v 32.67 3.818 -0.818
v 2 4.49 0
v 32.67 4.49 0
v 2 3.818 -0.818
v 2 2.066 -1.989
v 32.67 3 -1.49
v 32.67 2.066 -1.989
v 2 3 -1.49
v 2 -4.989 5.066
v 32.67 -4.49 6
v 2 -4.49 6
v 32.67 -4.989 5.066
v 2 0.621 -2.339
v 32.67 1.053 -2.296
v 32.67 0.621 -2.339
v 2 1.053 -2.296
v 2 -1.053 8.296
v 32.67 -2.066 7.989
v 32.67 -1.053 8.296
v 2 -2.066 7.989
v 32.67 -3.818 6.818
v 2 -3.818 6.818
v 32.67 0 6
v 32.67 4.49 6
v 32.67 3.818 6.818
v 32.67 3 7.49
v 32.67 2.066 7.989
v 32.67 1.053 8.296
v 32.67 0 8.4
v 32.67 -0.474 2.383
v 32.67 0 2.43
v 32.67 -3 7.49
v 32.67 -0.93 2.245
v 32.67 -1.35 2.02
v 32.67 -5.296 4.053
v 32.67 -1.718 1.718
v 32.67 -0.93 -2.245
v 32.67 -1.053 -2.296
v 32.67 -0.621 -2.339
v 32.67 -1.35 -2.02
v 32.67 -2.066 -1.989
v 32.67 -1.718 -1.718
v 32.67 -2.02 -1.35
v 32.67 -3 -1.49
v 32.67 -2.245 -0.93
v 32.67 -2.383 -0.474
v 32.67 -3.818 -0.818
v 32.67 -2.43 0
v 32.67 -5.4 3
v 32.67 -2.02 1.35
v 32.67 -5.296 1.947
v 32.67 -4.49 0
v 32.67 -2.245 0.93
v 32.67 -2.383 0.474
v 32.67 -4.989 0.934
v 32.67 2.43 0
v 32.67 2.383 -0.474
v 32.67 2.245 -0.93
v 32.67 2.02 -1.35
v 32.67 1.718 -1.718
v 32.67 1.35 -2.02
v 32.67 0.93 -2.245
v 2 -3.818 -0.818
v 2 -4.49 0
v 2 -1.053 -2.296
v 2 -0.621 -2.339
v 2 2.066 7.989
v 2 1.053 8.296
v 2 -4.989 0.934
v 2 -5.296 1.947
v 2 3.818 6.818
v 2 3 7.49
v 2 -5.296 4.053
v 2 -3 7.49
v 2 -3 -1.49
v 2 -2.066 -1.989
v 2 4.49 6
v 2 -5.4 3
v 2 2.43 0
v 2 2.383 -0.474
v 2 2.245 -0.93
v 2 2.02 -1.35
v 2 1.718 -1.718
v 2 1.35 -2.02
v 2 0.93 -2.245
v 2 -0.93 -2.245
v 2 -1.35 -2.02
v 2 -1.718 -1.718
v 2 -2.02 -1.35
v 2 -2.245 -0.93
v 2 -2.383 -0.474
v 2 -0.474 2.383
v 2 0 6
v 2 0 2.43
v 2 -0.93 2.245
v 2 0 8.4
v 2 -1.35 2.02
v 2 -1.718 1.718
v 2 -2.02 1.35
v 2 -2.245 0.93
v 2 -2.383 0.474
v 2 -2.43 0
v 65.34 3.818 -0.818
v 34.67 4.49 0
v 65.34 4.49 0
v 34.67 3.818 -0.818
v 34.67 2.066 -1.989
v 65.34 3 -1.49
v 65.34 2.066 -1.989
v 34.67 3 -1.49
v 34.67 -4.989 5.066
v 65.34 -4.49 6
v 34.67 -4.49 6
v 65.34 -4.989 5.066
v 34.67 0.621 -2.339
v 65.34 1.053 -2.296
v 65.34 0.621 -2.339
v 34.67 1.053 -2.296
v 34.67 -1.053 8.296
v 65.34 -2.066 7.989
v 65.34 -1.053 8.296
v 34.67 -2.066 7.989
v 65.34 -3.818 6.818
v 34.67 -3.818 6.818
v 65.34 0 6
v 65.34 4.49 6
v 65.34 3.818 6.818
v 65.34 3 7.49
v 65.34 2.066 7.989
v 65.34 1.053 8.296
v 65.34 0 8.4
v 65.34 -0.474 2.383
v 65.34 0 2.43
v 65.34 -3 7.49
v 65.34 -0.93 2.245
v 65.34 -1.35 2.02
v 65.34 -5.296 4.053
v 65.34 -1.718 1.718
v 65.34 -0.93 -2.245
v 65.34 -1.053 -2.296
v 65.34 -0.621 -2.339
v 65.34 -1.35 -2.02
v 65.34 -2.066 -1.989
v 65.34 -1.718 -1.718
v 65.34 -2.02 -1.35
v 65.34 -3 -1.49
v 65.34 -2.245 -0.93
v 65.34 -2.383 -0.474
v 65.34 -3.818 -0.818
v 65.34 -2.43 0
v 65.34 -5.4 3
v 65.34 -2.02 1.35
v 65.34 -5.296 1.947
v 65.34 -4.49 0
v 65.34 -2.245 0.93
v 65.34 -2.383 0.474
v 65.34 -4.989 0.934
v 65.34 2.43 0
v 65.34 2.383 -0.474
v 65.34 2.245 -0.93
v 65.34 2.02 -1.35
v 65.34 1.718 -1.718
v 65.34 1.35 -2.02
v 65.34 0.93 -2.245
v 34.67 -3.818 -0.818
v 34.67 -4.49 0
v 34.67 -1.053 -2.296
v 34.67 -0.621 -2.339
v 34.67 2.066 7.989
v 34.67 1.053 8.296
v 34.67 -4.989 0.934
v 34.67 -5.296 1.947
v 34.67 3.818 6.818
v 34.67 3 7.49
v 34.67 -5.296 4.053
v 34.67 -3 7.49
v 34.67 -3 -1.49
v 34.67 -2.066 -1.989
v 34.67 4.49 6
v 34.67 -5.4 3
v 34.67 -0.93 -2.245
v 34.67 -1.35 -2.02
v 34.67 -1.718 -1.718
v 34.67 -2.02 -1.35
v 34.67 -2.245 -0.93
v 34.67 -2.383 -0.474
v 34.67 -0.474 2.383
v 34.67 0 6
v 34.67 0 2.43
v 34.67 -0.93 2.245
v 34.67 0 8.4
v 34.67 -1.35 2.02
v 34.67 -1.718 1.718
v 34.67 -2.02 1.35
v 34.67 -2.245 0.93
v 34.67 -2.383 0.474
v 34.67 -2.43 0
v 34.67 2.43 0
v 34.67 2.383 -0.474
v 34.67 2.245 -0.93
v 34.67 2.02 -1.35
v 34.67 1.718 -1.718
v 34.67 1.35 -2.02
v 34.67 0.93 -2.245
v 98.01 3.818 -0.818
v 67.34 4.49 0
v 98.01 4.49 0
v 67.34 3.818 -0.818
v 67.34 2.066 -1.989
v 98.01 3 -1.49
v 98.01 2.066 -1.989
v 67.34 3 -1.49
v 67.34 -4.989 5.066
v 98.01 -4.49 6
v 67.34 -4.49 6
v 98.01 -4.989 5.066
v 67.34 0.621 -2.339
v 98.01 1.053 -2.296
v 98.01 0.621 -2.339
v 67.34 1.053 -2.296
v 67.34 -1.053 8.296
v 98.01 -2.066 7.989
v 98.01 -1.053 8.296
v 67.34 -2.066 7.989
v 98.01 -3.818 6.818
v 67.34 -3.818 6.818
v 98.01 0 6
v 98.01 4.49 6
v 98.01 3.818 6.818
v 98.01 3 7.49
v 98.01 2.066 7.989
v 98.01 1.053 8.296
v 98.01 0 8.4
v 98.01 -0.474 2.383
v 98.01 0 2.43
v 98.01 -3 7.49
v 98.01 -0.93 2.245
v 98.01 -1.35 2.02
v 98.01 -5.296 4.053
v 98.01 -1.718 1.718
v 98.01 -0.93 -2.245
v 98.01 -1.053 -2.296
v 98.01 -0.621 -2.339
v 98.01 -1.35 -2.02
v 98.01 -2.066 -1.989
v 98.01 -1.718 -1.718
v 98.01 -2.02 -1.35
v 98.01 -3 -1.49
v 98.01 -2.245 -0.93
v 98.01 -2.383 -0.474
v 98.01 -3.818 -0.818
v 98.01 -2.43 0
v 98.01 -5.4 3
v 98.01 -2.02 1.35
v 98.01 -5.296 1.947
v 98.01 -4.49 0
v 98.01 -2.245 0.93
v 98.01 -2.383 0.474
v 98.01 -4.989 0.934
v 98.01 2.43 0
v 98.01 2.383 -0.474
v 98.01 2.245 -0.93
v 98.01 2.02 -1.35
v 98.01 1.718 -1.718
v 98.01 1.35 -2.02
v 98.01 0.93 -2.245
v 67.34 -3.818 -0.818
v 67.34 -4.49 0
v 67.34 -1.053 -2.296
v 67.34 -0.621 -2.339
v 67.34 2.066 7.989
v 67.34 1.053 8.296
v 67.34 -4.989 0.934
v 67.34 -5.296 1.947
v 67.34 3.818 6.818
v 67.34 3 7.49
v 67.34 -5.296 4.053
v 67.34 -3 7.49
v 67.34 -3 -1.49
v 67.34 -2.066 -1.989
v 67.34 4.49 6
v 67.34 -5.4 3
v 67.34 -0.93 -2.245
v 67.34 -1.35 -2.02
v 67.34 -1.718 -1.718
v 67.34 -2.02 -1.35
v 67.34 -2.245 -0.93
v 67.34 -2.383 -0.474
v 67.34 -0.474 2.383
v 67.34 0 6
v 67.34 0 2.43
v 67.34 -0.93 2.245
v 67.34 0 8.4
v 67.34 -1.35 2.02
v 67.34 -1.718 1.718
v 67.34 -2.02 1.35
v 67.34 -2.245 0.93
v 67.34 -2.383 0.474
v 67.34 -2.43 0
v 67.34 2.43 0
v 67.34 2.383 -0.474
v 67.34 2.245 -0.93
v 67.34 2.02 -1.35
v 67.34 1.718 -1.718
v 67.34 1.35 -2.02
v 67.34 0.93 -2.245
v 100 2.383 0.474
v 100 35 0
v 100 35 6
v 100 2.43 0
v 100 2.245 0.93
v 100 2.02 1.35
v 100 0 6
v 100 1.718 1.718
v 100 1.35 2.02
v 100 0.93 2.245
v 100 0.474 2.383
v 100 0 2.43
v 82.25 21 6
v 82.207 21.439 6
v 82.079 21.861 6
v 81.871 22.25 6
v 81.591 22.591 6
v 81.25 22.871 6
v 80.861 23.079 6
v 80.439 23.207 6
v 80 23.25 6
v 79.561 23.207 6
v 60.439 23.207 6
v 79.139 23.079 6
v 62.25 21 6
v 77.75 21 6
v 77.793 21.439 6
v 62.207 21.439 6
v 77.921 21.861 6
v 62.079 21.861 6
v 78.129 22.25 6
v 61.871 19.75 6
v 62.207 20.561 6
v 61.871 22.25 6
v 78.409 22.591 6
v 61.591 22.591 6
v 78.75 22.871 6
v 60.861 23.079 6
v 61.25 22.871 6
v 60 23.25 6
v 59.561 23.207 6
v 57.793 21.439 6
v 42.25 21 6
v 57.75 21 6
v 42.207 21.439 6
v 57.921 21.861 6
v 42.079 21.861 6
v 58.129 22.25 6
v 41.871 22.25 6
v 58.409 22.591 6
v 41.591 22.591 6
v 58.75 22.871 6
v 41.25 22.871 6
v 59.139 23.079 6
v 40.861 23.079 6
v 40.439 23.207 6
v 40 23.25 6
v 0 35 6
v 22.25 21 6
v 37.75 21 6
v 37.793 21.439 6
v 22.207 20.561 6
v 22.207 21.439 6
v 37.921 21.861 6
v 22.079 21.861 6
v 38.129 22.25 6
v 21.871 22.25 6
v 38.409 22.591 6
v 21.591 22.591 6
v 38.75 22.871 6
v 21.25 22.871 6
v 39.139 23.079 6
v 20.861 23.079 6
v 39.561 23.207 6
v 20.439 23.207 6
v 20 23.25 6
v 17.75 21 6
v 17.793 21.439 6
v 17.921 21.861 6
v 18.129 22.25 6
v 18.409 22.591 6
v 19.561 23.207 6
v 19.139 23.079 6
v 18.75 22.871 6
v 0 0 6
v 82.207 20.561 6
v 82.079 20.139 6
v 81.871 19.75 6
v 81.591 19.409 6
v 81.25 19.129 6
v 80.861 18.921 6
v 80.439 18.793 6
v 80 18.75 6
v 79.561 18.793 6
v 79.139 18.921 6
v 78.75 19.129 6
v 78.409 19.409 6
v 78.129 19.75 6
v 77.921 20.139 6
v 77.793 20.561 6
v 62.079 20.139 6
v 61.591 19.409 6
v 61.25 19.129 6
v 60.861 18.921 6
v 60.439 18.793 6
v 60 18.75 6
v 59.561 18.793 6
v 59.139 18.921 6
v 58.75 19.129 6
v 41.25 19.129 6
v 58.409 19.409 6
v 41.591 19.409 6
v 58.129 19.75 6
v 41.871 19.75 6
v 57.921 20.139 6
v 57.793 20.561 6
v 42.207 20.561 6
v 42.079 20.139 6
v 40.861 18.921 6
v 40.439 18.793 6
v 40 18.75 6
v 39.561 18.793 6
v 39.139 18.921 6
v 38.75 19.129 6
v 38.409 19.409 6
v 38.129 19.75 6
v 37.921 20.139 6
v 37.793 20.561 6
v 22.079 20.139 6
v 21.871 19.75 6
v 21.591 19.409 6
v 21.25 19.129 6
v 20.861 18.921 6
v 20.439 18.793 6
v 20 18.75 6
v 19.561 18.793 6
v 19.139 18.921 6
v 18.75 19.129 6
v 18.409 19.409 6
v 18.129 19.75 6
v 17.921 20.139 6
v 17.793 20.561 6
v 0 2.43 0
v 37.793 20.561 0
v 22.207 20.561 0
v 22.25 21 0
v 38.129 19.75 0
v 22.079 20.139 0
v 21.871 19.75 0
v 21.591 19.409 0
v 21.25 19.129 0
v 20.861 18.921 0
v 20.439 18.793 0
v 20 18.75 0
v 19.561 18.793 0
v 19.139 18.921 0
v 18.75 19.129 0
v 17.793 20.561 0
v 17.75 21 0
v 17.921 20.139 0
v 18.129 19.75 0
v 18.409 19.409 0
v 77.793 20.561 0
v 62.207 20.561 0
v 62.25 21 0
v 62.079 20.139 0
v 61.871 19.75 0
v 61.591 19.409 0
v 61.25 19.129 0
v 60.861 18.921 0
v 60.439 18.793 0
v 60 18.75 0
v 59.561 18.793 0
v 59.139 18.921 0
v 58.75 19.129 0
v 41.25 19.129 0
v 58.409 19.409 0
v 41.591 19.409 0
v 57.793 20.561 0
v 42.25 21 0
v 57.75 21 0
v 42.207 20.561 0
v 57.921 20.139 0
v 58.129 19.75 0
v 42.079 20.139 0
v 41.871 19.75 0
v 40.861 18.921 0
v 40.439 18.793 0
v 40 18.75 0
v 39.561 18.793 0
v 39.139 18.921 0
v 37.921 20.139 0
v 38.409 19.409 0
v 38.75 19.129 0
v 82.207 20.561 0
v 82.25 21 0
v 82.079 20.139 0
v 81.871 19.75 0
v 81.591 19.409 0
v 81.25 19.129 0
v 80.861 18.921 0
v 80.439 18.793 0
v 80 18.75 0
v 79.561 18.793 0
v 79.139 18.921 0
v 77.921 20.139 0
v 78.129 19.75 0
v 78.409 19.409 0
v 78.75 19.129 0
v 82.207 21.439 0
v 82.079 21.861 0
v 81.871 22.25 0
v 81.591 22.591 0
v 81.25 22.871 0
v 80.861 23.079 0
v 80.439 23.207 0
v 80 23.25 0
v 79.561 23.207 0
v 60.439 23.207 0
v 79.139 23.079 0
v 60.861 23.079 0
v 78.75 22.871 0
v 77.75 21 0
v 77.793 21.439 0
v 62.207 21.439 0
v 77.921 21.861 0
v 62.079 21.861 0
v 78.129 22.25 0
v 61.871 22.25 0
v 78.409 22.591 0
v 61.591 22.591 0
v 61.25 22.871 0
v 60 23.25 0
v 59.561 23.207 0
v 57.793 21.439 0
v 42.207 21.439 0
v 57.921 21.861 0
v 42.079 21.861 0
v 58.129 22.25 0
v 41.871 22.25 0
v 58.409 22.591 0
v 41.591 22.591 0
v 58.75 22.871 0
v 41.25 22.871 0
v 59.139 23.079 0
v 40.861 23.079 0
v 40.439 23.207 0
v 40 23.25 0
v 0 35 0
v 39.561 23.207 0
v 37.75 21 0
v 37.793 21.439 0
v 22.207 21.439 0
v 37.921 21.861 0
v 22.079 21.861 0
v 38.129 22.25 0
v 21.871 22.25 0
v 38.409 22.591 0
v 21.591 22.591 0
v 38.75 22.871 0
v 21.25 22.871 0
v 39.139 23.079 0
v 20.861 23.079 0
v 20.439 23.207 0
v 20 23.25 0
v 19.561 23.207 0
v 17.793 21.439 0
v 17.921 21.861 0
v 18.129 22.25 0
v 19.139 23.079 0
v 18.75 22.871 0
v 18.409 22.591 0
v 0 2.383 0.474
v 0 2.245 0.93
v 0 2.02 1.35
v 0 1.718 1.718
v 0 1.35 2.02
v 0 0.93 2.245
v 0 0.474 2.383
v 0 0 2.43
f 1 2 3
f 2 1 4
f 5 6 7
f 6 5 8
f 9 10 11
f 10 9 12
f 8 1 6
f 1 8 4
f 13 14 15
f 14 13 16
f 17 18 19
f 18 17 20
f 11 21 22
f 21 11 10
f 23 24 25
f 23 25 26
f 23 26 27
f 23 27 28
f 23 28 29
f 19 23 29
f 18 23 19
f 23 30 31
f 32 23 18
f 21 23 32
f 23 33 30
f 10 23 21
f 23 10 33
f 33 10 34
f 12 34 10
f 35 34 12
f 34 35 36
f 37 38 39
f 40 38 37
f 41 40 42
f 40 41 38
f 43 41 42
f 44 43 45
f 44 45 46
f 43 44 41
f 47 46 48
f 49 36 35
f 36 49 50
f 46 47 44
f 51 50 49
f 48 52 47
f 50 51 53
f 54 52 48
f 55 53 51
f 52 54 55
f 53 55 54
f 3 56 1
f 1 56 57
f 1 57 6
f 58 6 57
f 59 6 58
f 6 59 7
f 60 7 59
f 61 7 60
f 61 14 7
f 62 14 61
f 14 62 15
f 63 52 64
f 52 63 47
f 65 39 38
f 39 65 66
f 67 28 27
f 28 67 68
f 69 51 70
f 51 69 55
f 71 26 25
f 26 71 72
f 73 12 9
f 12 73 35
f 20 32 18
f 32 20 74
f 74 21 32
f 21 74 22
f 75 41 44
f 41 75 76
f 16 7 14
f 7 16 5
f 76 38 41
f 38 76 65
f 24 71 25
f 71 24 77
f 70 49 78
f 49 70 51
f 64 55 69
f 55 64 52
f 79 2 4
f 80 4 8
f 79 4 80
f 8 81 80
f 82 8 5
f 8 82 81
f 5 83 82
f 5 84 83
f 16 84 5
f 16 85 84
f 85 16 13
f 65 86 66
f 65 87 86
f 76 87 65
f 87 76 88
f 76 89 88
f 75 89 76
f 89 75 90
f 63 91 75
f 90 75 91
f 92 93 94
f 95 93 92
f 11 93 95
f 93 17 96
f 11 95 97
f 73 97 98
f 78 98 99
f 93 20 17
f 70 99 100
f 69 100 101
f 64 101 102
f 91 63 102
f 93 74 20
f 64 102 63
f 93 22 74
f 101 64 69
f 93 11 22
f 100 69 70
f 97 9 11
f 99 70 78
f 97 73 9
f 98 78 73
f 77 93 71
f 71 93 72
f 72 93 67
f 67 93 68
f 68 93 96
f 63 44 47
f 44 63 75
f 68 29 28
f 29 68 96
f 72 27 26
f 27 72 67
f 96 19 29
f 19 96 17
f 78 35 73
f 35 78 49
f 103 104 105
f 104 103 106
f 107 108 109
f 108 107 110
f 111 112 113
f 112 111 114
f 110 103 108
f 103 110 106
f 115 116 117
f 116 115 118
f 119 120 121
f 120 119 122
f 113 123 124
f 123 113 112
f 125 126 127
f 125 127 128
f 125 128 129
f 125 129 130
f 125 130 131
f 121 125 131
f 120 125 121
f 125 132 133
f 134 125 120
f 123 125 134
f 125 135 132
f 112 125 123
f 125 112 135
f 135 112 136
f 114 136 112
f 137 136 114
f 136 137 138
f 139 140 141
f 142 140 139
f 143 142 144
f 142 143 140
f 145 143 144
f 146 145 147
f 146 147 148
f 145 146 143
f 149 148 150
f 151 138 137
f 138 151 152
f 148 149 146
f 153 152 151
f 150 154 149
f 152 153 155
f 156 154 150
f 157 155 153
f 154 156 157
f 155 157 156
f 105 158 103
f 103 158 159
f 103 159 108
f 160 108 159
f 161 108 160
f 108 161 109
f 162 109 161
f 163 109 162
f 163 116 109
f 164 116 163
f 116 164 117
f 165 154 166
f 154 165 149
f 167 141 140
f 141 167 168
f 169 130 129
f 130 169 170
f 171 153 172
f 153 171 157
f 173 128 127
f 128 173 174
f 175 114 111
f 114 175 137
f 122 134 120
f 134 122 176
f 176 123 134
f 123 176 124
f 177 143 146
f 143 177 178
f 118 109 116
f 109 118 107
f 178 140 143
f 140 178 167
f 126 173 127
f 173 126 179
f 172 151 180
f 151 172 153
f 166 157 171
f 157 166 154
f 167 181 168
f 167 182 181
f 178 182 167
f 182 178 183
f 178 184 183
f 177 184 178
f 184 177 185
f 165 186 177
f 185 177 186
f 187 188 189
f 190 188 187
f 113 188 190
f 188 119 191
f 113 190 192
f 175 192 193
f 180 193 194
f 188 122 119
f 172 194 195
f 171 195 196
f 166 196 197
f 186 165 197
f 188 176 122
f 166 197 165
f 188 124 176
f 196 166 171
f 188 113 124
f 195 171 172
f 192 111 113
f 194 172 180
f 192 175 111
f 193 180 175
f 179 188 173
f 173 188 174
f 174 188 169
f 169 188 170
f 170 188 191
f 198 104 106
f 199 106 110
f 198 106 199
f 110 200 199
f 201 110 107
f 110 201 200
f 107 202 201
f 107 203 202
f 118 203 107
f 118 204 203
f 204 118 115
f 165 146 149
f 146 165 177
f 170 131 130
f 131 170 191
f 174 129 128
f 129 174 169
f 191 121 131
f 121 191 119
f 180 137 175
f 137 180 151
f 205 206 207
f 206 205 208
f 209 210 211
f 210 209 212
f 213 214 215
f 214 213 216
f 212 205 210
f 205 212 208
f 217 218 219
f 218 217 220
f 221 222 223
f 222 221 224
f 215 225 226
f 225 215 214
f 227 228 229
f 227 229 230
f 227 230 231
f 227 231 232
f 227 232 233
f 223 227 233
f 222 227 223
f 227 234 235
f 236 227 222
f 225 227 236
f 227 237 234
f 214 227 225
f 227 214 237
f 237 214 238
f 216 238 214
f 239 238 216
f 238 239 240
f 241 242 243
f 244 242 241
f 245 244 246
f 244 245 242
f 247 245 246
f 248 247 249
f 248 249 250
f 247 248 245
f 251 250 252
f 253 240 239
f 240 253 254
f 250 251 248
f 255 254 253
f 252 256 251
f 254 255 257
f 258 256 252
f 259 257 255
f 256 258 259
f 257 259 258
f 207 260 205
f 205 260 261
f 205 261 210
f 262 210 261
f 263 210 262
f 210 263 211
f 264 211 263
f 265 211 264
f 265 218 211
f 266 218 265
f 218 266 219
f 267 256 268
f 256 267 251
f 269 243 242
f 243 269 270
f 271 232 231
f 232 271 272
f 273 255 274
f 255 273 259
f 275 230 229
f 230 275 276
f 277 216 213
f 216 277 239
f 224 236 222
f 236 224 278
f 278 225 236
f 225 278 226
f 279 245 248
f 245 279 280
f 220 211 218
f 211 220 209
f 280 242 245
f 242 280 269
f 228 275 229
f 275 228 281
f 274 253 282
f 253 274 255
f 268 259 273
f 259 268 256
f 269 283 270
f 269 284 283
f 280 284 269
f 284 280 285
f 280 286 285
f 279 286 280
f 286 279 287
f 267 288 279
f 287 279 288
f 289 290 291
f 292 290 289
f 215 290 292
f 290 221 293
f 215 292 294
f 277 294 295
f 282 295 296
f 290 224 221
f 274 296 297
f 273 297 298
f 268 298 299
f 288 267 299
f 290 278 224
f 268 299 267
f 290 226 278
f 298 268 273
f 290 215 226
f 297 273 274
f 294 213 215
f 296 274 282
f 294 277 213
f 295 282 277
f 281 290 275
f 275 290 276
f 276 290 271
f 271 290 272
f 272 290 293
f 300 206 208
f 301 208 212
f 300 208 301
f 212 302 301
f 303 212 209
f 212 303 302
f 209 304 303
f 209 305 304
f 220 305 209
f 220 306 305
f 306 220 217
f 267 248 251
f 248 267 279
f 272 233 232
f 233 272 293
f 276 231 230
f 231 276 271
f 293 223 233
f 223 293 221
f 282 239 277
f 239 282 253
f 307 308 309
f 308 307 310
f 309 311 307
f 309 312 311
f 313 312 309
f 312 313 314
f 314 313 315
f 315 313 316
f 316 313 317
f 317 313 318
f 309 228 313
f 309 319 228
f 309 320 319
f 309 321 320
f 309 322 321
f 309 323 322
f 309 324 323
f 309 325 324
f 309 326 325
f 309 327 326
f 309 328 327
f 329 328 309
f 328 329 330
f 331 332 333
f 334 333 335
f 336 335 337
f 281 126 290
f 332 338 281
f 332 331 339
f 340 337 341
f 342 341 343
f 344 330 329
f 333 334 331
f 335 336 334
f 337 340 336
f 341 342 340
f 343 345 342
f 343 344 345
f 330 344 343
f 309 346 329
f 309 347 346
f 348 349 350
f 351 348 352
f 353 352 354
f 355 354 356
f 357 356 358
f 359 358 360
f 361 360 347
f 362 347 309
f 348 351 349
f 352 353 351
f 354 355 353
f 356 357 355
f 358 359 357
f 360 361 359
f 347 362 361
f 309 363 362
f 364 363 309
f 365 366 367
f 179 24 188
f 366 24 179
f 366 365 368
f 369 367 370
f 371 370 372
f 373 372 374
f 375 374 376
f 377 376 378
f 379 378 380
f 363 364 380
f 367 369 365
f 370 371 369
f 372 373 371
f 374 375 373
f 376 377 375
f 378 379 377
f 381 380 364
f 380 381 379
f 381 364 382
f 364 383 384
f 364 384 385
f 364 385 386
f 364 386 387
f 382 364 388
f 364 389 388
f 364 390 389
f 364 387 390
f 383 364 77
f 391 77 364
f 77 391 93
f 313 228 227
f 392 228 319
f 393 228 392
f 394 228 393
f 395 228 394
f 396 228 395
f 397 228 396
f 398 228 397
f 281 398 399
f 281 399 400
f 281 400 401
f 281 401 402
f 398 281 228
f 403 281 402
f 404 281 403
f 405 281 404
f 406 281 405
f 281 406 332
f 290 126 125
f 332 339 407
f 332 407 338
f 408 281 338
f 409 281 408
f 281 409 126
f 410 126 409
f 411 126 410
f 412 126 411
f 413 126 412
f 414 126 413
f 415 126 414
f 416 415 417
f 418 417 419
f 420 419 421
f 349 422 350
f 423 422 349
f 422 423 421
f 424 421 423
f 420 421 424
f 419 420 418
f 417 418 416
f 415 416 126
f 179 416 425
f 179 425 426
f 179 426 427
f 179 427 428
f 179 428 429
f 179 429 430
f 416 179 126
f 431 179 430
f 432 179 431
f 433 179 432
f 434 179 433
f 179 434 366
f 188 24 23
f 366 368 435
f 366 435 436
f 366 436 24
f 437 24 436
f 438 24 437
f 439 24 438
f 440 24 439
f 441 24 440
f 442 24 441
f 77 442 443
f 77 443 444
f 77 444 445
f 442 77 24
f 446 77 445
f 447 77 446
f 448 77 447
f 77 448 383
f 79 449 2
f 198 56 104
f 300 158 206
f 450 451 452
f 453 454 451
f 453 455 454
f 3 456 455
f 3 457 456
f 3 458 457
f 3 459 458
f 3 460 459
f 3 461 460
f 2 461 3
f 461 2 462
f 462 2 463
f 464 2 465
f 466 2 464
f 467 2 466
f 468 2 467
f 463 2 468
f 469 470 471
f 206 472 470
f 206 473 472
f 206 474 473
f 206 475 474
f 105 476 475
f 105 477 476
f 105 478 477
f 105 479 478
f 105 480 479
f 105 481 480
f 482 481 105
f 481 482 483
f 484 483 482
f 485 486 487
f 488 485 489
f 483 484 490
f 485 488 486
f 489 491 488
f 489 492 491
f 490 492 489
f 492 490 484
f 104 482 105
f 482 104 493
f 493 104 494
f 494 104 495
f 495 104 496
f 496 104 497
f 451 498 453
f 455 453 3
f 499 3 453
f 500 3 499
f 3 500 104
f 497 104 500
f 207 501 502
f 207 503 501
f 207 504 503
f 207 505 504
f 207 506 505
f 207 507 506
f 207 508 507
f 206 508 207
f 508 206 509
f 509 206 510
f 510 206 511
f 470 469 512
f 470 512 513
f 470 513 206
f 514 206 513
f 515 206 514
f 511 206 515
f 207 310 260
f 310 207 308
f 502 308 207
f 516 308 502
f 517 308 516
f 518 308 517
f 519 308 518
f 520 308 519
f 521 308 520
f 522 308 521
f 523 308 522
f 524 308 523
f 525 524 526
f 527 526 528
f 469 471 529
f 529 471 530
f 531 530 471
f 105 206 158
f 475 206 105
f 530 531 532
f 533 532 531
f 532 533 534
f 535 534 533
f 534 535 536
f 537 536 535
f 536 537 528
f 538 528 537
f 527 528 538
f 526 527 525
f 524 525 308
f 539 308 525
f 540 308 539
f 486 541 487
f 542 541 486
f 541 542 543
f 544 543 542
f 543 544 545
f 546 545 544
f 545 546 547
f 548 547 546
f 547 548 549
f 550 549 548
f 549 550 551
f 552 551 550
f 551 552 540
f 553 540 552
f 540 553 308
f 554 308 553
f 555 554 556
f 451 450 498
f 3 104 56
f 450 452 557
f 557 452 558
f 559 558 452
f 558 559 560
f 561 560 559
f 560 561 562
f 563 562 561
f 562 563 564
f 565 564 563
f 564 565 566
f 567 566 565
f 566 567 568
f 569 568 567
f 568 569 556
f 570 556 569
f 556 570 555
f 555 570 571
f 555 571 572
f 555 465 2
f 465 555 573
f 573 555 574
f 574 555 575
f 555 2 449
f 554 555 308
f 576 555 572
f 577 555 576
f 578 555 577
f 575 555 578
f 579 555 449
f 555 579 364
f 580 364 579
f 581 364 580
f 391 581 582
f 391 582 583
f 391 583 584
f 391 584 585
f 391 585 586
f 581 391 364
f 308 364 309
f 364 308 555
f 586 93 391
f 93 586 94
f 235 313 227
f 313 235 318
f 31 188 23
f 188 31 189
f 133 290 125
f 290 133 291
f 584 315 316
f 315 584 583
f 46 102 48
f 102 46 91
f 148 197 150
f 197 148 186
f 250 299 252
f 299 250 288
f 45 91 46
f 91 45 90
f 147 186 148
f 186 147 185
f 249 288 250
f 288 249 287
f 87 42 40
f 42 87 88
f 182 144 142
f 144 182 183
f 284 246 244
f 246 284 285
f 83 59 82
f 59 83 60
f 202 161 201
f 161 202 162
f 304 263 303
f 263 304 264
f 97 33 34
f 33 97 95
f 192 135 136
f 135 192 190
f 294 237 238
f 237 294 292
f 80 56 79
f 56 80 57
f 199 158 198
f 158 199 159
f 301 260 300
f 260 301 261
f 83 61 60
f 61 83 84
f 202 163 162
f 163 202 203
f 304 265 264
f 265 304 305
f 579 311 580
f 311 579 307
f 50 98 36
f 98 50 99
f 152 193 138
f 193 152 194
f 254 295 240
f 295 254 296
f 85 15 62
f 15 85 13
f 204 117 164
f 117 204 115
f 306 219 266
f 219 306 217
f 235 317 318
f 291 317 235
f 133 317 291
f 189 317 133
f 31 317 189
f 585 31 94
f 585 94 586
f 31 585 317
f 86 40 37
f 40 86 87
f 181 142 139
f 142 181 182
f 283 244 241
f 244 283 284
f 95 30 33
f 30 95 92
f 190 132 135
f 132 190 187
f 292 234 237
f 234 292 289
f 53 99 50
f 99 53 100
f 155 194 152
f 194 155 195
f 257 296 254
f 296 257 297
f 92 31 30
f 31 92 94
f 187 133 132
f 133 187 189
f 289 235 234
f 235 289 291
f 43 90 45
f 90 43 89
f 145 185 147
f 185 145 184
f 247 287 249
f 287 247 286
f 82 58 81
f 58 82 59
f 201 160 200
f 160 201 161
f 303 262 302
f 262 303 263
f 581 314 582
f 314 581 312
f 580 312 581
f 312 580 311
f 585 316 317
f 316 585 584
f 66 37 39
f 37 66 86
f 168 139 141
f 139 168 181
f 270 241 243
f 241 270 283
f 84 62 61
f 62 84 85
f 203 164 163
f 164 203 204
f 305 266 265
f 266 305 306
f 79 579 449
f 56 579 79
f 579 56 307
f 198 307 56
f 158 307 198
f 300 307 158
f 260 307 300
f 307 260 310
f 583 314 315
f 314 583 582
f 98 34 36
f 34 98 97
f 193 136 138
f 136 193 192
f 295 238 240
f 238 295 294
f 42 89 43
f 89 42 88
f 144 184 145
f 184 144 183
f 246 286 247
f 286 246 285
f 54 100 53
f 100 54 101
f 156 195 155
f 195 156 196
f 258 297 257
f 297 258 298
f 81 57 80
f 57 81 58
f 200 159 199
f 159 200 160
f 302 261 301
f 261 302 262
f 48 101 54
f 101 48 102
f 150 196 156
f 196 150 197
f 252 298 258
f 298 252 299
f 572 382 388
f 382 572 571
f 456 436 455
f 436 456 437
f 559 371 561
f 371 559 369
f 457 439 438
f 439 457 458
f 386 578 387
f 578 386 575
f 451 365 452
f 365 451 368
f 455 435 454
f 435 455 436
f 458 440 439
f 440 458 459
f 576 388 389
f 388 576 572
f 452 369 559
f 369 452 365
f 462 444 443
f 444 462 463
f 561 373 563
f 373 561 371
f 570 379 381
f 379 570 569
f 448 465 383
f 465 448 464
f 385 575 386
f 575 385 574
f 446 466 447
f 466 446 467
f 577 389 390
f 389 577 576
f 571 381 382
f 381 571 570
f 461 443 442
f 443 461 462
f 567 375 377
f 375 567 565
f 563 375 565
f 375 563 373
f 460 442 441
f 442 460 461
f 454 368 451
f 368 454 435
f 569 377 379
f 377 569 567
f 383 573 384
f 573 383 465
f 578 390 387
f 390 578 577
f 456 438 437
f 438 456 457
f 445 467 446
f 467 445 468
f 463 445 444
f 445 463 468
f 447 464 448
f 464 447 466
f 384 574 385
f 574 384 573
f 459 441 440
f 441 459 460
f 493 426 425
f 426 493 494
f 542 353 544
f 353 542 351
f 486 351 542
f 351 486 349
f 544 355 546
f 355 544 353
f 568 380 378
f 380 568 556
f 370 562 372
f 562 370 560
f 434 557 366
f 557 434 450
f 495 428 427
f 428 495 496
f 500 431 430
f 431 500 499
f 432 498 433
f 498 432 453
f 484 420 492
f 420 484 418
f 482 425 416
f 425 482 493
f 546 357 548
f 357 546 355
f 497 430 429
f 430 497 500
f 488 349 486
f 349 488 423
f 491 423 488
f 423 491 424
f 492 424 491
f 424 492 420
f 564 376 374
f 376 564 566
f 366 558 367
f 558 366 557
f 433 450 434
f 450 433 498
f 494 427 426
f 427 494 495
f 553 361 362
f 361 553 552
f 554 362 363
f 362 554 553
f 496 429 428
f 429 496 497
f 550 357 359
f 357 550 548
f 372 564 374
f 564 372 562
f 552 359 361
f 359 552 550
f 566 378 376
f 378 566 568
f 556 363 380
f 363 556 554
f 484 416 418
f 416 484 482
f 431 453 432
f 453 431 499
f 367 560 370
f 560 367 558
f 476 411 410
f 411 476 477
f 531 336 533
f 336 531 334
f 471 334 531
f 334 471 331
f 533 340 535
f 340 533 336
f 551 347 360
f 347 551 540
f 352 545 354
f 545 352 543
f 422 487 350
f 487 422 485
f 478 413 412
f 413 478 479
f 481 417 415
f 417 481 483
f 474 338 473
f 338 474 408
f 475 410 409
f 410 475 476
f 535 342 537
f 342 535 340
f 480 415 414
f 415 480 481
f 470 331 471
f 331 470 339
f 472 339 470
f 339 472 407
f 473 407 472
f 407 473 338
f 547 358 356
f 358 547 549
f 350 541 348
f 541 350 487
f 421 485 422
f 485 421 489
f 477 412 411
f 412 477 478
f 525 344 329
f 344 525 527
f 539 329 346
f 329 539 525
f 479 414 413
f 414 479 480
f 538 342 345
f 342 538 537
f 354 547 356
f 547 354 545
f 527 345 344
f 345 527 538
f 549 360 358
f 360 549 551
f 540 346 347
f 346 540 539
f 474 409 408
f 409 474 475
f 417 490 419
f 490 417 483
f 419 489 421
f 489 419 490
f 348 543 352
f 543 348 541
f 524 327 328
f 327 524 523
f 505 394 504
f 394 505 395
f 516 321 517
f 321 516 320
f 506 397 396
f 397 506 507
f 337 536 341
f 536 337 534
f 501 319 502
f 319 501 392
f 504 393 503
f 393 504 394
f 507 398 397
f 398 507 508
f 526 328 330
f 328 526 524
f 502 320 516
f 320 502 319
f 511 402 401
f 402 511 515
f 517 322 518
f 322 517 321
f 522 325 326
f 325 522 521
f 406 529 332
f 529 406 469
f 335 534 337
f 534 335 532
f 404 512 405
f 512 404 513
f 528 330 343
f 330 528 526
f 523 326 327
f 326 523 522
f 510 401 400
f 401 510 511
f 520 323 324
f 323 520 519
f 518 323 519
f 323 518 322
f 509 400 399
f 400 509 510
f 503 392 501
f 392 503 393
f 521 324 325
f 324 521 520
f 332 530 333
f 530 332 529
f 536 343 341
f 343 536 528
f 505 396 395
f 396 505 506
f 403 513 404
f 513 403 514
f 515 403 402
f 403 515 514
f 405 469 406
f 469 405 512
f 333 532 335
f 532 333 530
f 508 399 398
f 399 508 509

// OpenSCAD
$fn = 32;

// ----------------------------------------------------------------------
// Hinge leaf: 100 x 40.4 x 10.8 mm
// ----------------------------------------------------------------------

// --- parameters (mm) ---
leaf_len = 100;           // leaf length, X
leaf_w = 35;              // leaf width, Y
leaf_t = 6;               // leaf thickness
knuckle_d = 10.8;         // knuckle diameter
knuckle_w = 30.67;        // knuckle width
knuckle_n = 3;            // number of knuckles
pin_d = 4.86;             // pin bore
gap = 2;                  // gap between the knuckles
screw_d = 4.5;            // screw clearance

module leaf() {
  cube([leaf_len, leaf_w, leaf_t]);
}

module knuckles() {
  /* barrels sit on the leaf edge, the pin axis at half the leaf thickness */
  for (i = [0 : knuckle_n - 1])
    translate([gap + i * (knuckle_w + gap), 0, leaf_t * 0.5])
      rotate([0, 90, 0]) cylinder(h = knuckle_w, d = knuckle_d);
}

difference() {
  union() {
    leaf();
    knuckles();
  }
  rotate([0, 90, 0]) translate([0, 0, -1])
    cylinder(h = leaf_len + 2, d = pin_d);
  translate([20, leaf_w * 0.6, -1]) cylinder(h = leaf_t + 2, d = screw_d);
  translate([40, leaf_w * 0.6, -1]) cylinder(h = leaf_t + 2, d = screw_d);
  translate([60, leaf_w * 0.6, -1]) cylinder(h = leaf_t + 2, d = screw_d);
  translate([80, leaf_w * 0.6, -1]) cylinder(h = leaf_t + 2, d = screw_d);
}
